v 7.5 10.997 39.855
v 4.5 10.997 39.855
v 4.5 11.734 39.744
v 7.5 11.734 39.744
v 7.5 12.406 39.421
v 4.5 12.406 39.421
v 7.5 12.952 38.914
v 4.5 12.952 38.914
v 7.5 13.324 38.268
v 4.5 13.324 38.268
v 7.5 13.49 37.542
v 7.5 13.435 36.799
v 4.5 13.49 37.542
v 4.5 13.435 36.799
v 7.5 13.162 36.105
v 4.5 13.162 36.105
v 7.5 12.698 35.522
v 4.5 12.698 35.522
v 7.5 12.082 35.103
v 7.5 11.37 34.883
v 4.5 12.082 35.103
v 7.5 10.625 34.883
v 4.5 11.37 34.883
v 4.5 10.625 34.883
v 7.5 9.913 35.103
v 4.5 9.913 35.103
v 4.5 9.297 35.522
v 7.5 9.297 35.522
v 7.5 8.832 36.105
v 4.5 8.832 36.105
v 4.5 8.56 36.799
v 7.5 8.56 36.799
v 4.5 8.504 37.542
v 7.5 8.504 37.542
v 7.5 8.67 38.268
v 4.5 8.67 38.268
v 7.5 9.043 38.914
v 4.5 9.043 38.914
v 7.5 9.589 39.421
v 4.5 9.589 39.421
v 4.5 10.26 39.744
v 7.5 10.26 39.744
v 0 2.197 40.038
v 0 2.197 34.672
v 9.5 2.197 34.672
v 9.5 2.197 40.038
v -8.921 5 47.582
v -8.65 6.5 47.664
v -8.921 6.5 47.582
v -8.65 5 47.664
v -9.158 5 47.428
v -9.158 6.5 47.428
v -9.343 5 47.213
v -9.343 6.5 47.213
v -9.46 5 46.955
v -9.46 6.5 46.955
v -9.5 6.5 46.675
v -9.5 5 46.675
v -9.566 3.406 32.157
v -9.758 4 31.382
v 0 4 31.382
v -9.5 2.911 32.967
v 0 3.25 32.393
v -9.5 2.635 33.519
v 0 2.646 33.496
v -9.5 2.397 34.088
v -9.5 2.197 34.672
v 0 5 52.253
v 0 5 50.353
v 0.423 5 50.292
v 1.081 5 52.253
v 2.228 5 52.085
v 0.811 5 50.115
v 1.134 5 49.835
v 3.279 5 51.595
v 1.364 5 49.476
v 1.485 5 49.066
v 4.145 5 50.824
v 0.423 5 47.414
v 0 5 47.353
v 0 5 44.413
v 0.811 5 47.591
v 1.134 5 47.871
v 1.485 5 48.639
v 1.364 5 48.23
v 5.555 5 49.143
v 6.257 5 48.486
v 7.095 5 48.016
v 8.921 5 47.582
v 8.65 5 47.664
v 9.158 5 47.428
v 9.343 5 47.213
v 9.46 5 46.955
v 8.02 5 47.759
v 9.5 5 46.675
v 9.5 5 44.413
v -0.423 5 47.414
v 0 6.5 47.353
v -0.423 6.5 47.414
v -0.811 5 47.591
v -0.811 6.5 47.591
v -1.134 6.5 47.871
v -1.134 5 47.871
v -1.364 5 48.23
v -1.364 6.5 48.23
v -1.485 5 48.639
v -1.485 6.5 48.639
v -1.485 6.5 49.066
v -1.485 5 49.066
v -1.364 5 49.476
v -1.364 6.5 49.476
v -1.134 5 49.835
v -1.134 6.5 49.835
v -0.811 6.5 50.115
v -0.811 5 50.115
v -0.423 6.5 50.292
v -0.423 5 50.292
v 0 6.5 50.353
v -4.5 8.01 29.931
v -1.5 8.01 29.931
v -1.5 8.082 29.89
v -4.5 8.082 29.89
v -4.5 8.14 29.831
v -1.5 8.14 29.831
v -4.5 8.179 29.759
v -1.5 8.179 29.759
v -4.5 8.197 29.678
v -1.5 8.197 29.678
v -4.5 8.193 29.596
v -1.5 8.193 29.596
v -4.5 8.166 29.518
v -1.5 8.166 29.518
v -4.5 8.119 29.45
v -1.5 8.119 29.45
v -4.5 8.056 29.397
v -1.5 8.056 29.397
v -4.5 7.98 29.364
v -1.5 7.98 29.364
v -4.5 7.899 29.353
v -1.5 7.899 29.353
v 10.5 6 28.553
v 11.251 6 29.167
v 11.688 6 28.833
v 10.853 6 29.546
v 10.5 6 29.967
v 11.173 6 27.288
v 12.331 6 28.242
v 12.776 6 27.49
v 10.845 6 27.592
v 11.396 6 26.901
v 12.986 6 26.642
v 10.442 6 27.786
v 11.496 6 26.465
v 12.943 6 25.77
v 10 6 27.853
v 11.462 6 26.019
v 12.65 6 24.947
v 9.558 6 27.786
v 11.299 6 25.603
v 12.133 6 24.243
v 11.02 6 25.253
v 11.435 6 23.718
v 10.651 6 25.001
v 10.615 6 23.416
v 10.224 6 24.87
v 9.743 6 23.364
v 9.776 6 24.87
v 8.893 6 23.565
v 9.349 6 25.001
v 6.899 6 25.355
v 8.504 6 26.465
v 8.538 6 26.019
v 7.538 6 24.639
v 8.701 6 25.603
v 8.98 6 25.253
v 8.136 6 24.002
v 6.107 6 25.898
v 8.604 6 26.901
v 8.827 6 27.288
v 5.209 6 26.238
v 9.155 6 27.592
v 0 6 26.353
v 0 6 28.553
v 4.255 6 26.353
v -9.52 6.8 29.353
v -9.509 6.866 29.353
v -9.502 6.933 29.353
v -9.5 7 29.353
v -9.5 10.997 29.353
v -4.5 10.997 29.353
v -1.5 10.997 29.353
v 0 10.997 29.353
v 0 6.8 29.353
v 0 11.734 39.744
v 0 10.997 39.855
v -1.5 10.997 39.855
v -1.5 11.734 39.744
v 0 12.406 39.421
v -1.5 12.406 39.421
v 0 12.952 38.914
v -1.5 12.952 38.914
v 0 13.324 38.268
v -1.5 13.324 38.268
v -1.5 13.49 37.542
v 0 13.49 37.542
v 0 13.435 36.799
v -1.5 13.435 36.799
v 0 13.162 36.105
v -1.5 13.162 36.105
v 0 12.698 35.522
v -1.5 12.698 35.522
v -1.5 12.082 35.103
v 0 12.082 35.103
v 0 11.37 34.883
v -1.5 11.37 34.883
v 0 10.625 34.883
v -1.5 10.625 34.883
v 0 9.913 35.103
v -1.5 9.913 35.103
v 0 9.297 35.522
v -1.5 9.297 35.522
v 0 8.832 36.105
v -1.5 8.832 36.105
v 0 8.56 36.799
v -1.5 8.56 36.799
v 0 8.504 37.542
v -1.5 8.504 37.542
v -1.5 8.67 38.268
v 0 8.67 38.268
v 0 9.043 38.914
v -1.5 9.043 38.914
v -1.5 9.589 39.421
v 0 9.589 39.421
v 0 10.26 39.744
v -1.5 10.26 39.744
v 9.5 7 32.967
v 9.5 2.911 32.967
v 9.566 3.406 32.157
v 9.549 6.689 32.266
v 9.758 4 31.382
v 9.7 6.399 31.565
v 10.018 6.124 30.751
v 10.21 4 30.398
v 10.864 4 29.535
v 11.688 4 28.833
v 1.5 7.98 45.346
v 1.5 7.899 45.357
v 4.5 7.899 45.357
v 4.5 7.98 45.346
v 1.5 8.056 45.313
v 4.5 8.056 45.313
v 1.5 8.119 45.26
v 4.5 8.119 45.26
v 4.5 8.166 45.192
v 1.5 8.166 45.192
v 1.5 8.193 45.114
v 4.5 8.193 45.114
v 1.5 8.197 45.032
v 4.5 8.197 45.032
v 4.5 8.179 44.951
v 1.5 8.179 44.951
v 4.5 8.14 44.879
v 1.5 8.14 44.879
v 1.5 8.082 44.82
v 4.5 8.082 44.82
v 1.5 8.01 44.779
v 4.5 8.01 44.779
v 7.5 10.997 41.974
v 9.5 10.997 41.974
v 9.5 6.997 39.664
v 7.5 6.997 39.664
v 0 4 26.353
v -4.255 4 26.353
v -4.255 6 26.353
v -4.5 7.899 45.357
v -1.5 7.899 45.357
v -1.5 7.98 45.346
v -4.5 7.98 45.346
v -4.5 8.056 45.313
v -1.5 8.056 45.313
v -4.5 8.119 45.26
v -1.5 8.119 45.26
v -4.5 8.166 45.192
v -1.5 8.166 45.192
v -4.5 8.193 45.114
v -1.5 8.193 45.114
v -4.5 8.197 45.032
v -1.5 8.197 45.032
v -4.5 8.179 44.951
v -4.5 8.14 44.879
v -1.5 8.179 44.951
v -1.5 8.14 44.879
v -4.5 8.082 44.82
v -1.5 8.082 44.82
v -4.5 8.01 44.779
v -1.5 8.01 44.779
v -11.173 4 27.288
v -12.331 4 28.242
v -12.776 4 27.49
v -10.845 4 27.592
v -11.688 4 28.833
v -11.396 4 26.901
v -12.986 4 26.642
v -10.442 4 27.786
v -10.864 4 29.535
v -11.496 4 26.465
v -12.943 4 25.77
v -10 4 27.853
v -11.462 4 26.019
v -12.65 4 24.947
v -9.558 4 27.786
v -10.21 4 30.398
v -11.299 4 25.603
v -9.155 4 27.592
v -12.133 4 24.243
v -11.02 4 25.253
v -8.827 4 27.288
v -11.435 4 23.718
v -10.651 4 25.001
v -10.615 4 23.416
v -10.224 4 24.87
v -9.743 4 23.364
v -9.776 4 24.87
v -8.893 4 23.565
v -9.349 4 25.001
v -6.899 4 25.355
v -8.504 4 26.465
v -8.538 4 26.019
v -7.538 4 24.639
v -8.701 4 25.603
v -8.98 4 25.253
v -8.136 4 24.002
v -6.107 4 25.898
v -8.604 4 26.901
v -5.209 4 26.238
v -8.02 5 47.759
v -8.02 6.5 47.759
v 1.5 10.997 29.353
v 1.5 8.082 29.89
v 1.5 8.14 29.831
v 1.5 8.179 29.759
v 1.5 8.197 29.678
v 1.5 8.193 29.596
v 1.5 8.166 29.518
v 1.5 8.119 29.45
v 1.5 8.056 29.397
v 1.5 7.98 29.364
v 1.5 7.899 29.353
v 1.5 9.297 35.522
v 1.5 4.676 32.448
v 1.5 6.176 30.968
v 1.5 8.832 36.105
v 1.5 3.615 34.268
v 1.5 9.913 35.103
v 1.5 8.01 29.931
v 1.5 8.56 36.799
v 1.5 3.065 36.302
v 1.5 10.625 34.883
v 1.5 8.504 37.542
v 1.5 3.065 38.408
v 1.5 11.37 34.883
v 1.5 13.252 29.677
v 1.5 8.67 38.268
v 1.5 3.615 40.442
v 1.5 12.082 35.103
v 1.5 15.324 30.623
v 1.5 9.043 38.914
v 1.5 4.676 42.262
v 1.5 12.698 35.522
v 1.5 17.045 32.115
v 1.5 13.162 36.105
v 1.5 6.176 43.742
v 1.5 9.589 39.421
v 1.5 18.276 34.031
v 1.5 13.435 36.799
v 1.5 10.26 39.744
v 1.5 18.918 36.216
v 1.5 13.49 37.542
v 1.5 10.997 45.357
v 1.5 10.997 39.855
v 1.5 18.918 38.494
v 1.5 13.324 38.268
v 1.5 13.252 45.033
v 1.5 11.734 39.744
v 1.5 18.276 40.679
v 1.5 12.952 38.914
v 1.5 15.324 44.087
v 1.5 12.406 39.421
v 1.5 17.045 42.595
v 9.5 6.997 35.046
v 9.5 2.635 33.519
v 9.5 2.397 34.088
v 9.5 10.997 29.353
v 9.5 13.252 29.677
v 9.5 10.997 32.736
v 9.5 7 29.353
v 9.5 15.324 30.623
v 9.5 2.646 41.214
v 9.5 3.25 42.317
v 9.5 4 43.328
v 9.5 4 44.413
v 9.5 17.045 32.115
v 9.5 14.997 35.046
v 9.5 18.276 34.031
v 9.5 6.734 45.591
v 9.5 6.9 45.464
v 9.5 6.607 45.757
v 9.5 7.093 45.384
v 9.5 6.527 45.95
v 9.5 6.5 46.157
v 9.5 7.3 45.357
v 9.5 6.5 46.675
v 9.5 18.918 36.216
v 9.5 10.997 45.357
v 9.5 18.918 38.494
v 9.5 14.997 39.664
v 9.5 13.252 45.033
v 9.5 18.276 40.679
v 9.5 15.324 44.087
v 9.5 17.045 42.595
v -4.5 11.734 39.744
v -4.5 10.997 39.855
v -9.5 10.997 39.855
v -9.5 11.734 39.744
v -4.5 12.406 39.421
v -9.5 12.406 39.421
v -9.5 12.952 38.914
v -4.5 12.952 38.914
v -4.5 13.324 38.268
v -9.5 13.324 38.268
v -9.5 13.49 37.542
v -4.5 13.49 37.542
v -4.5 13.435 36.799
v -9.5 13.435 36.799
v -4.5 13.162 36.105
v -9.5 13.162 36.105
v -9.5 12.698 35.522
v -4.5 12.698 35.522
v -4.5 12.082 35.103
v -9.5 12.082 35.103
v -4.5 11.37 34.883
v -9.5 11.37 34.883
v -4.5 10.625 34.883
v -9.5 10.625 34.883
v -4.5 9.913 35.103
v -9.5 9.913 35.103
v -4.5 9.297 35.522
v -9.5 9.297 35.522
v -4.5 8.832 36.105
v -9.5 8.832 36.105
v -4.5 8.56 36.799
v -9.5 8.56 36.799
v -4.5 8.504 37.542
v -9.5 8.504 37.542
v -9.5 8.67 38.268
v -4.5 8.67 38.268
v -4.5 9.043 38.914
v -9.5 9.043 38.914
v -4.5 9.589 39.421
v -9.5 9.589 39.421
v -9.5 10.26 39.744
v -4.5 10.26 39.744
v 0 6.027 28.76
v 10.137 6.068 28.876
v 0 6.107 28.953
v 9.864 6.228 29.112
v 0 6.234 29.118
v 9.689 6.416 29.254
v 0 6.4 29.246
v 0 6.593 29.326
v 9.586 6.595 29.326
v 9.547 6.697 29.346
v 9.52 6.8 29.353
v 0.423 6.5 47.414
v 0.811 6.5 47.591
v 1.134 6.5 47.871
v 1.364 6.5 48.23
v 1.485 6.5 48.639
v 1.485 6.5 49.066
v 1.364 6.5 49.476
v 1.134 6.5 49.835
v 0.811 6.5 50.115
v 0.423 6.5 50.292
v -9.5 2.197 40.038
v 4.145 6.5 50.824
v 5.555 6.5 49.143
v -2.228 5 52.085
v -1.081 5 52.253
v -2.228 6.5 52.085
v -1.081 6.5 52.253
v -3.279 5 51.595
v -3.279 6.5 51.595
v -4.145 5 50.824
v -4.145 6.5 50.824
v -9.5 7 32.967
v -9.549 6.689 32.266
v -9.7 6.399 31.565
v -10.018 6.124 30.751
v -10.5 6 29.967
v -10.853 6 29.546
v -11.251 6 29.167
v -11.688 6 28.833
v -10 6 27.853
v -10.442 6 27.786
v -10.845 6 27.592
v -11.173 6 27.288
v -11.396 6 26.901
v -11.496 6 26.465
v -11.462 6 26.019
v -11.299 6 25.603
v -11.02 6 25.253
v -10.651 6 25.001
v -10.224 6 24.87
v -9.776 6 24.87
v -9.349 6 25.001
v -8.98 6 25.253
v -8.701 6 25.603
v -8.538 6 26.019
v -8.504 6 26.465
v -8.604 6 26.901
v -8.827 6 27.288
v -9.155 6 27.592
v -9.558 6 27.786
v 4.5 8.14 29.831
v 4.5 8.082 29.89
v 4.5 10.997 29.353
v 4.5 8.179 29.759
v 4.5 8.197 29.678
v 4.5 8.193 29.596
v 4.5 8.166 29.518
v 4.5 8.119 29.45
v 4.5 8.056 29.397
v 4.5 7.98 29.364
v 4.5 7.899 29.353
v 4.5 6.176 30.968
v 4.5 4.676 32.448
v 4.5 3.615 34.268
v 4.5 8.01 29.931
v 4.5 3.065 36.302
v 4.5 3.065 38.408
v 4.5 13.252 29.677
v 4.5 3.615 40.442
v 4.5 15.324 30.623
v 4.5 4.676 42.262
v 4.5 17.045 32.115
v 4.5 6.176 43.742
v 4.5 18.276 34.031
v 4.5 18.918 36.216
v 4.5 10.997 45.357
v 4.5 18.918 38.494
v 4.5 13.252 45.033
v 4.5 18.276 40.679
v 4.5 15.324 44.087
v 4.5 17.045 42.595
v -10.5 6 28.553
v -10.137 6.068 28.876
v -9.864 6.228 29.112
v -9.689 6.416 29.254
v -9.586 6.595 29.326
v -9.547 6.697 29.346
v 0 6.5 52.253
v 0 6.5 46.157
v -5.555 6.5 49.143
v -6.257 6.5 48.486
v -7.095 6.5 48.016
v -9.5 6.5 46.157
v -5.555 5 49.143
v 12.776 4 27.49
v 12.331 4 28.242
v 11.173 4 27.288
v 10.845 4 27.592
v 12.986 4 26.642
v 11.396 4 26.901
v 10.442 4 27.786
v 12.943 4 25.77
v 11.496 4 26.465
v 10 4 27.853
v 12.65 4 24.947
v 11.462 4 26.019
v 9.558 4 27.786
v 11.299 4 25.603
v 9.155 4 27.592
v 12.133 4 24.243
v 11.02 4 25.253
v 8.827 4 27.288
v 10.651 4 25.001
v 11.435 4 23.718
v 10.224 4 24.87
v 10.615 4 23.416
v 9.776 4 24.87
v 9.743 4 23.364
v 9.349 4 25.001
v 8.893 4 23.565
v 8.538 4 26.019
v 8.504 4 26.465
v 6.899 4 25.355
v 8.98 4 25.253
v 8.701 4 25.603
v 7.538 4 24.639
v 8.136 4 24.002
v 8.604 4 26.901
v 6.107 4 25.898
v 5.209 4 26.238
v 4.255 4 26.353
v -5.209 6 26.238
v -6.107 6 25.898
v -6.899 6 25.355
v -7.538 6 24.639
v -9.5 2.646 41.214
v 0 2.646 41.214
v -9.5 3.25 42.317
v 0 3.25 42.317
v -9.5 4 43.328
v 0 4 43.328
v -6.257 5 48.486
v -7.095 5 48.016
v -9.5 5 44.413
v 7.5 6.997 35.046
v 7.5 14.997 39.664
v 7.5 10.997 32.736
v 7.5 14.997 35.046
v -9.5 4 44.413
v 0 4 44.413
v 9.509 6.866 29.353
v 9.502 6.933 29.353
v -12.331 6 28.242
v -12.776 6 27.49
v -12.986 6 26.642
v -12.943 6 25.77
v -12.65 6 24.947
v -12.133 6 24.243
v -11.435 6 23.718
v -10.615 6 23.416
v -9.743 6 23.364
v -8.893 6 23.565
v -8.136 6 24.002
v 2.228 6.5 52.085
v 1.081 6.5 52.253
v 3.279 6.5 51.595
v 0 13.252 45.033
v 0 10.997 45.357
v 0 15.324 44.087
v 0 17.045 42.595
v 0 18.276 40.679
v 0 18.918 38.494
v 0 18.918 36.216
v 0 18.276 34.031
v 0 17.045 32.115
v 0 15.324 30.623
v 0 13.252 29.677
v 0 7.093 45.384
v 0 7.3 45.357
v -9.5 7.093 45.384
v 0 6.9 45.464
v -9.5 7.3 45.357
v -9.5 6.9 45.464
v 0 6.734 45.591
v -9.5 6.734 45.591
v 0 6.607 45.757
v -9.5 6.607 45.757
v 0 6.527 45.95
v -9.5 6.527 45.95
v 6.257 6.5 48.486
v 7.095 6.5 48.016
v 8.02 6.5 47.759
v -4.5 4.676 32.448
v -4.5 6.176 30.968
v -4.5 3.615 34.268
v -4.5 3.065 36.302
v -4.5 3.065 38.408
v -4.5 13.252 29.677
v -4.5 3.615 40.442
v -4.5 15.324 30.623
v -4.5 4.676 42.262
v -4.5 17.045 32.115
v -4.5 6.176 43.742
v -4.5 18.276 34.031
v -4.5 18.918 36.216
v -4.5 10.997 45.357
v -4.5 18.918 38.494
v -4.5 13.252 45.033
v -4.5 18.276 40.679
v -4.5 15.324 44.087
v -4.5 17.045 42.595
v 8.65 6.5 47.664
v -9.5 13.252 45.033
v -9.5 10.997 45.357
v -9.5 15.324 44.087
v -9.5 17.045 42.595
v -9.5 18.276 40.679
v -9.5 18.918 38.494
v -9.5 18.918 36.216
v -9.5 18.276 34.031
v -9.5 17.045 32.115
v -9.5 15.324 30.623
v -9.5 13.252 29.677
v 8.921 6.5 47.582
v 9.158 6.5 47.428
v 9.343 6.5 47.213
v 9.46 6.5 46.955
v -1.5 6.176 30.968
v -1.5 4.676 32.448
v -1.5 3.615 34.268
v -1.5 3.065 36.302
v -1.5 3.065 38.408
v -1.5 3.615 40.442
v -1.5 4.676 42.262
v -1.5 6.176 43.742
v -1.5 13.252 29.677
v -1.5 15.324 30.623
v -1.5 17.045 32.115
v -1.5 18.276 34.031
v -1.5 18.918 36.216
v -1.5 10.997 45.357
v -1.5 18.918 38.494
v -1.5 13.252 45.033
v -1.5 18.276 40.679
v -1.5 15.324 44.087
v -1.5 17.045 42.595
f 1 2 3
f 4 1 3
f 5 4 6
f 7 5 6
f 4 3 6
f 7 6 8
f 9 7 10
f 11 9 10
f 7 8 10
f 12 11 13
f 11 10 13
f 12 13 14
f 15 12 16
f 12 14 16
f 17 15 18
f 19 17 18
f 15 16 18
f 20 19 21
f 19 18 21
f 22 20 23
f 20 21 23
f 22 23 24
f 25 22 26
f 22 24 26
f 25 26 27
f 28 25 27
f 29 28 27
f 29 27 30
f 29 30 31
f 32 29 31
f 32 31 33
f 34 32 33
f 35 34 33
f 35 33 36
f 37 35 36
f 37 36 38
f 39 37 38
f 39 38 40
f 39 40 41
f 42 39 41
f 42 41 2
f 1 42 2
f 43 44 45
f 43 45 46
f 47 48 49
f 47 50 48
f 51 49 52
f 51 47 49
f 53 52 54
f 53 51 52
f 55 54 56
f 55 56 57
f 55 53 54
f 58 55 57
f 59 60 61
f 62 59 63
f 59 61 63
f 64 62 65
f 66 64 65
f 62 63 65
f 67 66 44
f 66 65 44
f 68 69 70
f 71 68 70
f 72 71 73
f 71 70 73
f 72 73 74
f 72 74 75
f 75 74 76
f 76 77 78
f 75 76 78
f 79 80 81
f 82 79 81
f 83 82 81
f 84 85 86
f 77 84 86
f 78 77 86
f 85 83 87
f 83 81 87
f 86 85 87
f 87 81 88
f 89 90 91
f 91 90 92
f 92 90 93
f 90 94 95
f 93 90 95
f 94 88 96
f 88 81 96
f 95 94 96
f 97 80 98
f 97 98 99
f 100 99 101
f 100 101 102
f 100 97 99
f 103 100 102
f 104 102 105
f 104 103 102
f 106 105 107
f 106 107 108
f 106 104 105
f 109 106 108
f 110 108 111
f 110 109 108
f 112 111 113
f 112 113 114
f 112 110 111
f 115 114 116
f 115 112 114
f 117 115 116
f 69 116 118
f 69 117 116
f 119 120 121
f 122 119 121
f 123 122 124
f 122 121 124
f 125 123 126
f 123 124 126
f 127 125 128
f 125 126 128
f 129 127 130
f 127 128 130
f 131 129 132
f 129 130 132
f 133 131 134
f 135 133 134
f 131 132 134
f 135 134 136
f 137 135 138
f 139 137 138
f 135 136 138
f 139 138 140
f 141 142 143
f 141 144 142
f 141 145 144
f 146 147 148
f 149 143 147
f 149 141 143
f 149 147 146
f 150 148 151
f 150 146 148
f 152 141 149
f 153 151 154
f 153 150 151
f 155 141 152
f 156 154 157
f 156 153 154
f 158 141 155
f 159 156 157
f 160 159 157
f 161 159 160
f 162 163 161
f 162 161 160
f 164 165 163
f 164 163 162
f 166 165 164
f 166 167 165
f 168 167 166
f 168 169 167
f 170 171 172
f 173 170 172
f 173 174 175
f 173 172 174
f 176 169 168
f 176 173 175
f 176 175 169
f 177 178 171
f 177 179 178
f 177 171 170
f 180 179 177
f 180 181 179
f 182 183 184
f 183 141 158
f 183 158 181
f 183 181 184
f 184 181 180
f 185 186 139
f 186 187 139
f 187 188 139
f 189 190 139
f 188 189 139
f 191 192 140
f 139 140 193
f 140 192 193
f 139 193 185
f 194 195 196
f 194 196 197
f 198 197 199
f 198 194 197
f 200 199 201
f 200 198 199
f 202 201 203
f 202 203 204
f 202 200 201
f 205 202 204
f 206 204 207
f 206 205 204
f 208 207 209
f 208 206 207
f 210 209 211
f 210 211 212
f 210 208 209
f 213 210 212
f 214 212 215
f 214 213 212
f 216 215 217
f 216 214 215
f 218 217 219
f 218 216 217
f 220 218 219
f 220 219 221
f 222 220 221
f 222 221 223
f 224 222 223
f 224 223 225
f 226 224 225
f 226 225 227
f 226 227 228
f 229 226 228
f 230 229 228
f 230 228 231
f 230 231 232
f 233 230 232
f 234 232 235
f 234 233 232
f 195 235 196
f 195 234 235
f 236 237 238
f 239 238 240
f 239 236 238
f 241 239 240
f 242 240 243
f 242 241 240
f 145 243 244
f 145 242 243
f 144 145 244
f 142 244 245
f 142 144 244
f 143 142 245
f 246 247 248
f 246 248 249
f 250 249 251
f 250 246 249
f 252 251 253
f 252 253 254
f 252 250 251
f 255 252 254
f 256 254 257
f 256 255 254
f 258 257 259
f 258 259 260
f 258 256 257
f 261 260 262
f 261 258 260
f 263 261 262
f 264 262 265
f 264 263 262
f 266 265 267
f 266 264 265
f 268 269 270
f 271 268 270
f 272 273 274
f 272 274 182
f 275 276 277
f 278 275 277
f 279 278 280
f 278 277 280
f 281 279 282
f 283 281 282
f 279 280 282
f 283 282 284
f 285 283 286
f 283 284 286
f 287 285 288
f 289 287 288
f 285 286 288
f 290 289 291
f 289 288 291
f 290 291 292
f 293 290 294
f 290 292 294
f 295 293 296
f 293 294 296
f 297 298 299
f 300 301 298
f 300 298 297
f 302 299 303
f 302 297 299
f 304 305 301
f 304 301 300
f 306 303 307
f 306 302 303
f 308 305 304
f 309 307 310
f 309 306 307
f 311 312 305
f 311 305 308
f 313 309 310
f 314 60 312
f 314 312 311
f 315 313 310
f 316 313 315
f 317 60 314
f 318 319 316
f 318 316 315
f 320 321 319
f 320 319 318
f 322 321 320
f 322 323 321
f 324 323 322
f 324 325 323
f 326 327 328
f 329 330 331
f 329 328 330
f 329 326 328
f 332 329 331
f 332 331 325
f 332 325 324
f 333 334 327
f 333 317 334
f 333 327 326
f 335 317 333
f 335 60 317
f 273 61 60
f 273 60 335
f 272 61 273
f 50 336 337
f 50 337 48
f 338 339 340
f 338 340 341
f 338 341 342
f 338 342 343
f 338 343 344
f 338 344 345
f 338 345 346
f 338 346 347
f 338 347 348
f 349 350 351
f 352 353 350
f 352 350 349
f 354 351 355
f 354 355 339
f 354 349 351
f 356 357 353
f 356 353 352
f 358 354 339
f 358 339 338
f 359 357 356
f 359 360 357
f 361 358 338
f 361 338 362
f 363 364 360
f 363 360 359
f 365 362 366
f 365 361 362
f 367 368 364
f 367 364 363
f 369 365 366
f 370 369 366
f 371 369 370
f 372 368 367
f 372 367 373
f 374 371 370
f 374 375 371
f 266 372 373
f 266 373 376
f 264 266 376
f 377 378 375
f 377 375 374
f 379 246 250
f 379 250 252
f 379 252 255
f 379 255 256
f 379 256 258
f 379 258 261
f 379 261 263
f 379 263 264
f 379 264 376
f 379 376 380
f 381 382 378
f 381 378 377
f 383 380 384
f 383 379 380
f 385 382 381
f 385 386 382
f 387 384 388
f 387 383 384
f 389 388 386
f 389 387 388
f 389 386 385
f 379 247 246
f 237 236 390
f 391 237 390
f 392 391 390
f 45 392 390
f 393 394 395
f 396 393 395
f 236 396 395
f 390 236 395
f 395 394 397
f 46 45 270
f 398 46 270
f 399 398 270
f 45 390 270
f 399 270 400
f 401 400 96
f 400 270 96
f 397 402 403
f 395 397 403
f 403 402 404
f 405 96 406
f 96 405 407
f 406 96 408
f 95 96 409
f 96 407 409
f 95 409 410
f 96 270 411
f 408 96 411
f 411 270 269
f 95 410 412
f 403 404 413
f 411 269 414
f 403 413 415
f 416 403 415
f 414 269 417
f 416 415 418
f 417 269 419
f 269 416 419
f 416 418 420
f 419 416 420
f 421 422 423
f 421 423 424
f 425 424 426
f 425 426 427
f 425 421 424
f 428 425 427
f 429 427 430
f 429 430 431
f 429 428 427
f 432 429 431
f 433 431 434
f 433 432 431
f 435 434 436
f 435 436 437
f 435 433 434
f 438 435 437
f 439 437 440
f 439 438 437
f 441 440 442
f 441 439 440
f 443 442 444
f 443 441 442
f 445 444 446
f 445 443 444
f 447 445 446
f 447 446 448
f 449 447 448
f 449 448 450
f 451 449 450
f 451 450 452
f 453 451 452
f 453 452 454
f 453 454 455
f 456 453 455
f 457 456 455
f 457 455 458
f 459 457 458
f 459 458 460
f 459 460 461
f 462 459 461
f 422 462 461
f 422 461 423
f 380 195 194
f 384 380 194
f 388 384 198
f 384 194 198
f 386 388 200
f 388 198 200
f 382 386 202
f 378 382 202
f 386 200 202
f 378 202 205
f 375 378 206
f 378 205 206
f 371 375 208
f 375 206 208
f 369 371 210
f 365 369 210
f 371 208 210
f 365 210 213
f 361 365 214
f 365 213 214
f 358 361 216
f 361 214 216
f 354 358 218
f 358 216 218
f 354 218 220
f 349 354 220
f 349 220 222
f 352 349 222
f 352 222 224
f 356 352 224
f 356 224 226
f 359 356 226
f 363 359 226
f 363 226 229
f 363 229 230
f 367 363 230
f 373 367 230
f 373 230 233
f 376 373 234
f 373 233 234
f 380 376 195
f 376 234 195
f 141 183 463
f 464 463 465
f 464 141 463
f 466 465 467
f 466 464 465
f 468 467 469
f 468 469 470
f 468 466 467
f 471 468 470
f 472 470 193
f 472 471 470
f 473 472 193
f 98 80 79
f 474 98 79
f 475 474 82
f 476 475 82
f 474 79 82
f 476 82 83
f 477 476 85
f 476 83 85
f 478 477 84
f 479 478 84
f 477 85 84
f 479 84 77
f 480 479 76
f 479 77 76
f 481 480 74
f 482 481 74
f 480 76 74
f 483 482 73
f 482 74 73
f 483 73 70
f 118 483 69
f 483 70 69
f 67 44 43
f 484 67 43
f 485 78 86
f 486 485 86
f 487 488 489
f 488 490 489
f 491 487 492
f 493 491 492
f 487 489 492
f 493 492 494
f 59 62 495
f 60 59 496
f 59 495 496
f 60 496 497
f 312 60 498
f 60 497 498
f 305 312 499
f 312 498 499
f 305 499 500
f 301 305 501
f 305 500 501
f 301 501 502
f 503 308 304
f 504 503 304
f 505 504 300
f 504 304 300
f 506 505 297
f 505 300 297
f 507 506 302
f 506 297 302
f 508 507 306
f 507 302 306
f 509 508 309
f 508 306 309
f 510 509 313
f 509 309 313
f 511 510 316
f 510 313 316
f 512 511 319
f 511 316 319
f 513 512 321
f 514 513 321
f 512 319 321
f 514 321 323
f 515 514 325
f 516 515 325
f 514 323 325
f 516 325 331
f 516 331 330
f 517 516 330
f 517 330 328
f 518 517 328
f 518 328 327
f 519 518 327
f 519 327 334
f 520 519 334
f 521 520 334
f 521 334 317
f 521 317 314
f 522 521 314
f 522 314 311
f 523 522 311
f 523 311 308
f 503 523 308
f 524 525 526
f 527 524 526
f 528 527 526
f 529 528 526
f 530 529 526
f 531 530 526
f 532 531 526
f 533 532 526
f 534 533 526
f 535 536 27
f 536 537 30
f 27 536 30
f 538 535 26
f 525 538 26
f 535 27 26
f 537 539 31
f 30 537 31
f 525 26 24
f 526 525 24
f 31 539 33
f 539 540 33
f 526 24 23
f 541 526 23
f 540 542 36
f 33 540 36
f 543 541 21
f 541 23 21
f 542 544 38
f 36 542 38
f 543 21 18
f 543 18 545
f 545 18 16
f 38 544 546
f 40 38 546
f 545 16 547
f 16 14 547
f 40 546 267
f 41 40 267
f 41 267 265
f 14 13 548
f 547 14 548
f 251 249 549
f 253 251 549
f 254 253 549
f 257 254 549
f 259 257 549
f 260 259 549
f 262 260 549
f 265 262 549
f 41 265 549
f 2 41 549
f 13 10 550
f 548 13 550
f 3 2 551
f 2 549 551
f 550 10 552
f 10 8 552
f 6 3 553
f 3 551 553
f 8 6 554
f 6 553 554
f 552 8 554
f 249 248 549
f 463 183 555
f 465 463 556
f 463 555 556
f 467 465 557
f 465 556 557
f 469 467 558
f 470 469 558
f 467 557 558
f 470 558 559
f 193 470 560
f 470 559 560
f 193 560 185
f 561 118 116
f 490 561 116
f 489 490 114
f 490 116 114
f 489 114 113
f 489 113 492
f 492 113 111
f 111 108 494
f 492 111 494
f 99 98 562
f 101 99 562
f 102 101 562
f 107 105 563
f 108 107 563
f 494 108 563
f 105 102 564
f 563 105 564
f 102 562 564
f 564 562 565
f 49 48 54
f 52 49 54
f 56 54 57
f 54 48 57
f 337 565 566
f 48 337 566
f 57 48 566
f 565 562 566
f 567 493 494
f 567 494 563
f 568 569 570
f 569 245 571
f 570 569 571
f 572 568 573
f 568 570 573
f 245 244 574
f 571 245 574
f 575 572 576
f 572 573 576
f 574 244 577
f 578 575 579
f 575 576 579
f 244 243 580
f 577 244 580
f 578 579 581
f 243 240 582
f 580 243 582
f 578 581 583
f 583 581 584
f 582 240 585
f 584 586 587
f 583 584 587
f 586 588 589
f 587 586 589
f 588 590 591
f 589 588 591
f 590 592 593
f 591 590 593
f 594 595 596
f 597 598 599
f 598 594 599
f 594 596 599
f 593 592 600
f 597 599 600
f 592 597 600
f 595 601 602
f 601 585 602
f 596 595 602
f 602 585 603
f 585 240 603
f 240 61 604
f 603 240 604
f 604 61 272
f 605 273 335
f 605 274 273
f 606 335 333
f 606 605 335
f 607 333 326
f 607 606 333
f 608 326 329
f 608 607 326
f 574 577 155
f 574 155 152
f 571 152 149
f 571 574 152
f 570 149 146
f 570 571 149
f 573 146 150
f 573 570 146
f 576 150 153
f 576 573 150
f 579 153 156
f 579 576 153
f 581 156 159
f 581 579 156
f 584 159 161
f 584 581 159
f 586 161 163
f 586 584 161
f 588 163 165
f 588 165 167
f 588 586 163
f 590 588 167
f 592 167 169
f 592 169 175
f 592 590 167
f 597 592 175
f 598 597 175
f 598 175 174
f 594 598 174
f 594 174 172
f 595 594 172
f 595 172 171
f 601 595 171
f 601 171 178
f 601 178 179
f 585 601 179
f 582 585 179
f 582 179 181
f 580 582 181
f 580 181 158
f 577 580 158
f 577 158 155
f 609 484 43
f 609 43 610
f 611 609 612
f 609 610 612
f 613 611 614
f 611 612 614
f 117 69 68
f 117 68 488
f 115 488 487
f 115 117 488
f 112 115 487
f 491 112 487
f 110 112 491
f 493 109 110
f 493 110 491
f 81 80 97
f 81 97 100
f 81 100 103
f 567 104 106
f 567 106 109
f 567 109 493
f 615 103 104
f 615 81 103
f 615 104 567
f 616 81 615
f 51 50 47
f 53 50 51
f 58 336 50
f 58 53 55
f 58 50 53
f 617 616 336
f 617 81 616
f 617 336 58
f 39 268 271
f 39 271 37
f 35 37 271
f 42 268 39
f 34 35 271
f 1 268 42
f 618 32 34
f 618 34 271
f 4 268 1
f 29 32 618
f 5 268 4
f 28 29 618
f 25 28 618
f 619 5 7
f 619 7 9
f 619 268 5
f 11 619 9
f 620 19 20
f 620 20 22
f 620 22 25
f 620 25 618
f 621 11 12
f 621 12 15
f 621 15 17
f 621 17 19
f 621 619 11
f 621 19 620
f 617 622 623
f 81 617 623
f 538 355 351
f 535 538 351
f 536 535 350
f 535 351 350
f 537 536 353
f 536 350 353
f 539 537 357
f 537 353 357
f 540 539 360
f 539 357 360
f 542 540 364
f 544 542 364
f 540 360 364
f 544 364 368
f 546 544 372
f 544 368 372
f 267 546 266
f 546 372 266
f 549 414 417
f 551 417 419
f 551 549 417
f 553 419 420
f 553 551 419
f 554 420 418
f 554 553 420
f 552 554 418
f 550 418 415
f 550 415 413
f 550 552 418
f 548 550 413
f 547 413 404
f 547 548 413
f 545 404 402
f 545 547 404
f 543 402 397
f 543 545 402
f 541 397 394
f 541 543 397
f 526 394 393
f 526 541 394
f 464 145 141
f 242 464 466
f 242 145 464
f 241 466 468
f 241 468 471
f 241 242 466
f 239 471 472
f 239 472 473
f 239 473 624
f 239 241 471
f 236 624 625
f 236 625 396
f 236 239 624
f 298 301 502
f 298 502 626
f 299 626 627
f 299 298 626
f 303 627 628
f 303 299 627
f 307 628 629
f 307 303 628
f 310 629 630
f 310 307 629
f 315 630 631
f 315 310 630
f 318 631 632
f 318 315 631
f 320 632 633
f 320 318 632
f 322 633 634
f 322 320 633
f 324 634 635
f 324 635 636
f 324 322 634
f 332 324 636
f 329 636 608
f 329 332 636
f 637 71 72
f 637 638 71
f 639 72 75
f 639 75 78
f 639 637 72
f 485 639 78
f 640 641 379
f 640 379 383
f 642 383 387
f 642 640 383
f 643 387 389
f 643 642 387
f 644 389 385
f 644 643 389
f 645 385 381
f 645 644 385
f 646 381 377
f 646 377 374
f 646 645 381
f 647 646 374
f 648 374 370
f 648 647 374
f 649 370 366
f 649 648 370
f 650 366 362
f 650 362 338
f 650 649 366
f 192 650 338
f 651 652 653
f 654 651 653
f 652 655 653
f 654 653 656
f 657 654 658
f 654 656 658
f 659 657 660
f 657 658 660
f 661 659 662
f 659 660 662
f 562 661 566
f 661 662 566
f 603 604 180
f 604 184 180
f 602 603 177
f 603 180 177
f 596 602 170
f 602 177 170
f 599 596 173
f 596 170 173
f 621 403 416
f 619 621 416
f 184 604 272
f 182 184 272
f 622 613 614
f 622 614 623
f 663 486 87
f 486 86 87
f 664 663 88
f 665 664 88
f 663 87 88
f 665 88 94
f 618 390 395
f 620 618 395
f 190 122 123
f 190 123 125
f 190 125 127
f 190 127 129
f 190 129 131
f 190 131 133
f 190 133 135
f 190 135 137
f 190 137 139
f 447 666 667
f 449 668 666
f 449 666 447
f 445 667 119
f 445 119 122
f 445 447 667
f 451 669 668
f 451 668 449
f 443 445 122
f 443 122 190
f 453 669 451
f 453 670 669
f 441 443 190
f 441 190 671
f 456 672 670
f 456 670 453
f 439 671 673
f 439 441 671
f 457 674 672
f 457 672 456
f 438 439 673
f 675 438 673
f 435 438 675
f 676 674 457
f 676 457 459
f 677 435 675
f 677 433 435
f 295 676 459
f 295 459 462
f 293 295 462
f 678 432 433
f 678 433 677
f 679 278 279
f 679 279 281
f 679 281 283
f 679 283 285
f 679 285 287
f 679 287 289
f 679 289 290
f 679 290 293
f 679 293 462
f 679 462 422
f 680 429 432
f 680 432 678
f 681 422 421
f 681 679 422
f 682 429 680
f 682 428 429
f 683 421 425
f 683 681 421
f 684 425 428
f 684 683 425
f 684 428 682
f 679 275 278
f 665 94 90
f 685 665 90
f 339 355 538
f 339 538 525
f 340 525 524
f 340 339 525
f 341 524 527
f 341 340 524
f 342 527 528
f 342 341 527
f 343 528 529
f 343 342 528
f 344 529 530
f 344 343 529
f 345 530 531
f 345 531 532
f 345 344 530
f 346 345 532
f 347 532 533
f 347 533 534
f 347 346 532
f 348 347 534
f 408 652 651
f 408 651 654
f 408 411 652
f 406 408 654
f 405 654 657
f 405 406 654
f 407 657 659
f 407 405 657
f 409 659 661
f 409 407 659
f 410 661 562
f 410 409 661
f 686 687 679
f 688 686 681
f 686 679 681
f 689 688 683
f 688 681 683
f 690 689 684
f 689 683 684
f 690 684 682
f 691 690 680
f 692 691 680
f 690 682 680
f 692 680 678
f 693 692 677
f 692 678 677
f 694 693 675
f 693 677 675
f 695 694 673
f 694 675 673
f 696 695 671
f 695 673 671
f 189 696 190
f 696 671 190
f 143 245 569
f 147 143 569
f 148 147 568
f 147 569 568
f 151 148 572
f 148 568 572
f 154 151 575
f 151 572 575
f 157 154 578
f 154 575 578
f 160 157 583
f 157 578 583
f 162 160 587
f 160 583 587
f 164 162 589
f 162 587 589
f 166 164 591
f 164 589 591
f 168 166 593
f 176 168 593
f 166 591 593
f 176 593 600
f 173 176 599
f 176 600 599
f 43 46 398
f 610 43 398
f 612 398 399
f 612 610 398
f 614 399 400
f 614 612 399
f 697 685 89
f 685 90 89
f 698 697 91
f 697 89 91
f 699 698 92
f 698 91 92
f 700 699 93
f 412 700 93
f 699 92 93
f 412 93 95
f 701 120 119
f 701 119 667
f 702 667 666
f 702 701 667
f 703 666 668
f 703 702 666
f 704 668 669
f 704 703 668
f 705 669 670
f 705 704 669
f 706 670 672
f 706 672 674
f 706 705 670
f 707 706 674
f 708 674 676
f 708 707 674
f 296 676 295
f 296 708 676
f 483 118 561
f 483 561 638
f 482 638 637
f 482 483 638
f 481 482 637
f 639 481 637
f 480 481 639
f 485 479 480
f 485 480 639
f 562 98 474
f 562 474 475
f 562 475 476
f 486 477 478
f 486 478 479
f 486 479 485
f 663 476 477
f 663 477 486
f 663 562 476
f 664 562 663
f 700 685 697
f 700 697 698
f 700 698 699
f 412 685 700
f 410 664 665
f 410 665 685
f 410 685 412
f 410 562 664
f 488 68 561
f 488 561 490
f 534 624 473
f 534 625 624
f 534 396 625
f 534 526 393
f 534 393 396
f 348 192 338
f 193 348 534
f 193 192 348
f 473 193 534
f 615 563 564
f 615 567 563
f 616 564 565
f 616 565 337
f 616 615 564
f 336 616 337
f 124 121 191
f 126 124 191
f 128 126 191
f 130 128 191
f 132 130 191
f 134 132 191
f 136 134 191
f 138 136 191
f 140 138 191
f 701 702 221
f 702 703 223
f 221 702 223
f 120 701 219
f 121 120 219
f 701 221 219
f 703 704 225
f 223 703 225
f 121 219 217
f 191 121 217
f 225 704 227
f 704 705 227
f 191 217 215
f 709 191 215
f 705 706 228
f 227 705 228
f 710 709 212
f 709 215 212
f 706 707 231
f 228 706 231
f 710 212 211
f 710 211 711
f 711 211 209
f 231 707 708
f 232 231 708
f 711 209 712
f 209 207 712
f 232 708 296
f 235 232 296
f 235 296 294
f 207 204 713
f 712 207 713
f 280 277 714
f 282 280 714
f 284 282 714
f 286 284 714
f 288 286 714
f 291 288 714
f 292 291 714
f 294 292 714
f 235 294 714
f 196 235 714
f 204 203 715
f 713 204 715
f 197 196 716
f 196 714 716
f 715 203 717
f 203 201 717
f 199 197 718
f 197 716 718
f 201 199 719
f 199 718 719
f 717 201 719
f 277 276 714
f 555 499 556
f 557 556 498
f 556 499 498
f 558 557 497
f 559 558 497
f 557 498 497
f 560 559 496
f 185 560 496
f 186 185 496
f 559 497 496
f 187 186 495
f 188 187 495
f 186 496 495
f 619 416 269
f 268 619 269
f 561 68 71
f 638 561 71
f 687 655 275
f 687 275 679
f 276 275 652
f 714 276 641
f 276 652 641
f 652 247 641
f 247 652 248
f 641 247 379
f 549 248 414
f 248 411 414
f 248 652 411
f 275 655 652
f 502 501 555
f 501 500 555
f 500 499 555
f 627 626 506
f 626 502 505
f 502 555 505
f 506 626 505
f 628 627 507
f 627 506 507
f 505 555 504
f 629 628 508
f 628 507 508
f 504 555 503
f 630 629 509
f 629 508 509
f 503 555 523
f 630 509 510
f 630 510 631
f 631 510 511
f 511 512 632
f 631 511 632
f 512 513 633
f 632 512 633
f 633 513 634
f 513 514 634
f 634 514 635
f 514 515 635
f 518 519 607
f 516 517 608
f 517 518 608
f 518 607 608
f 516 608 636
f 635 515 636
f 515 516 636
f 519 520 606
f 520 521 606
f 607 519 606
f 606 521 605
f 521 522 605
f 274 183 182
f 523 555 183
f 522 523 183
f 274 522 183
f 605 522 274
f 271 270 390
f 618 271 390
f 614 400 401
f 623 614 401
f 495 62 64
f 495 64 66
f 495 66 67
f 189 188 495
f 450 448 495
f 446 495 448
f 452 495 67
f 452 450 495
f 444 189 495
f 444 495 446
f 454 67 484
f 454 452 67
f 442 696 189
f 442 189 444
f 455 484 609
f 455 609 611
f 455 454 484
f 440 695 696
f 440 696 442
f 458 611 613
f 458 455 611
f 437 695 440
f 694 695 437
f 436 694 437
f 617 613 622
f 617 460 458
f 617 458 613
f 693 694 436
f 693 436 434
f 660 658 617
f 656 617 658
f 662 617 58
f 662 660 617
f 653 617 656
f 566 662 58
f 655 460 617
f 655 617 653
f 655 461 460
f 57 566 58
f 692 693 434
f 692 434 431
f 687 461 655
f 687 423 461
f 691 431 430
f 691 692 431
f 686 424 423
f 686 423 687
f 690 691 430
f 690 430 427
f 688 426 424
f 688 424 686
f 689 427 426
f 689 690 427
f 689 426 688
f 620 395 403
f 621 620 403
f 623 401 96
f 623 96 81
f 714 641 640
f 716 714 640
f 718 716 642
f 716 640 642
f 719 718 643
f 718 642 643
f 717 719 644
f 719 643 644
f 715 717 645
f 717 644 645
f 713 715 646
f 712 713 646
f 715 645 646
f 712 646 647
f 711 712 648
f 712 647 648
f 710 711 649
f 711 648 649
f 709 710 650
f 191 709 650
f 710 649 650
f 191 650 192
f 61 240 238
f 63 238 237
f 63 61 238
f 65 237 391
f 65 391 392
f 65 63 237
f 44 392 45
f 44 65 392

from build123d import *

# Parameters (mm, degrees)
EXTRUDE_1_DEPTH     = 6.5
SKETCH_1_7_R        = 1.5000000000000009
EXTRUDE_2_DEPTH     = 6
SKETCH_1_5_R        = 1.5000000000000009
CUT_EXTRUDE_1_DEPTH = 4
SKETCH_4_R          = 2.5000000000000018
EXTRUDE_3_DEPTH     = 9.5
SKETCH_4_3_R        = 8.002176317228214
CUT_EXTRUDE_3_DEPTH = 4.5
SKETCH_4_4_R        = 8.002176317228214
SKETCH_4_4_R_2      = 2.5000000000000018
EXTRUDE_4_DEPTH     = 1.5
CUT_EXTRUDE_7_DEPTH = 5
FILLET_10_R         = 5
FILLET_12_R         = 1
FILLET_8_R          = 4
FILLET_15_R         = 4
FILLET_14_R         = 0.8
FILLET_START        = 1.5
FILLET_16_DEPTH     = 3
CUT_EXTRUDE_8_DEPTH = 2


with BuildPart() as part:
    # 草图1 → 凸台-拉伸1 (new body)
    with BuildSketch(Plane(origin=(0, 0, 0), x_dir=(1, 0, 0), z_dir=(0, 1, 0))):
        with BuildLine():
            Line((6.526515759031646, -47.98540773429276), (9.500000000000004, -47.53500853797252))
            Line((9.5, -47.53500853797252), (9.5, -44.41312259021298))
            Line((9.5, -44.41312259021298), (-3.197e-14, -44.41312259021298))
            Line((-3.234e-14, -44.41312259021298), (-3.819e-14, -47.352813742384996))
            ThreePointArc((-3.795e-14, -47.352813742384996), (1.4999999999999172, -48.852813742385), (-6.167e-14, -50.35281374238498))
            Line((-6.167e-14, -50.35281374238498), (5e-17, -52.25281374238501))
            Line((5e-17, -52.25281374238501), (2.945736951557686, -52.25281374238501))
            Line((2.9457369515576866, -52.25281374238501), (6.52651575903164, -47.98540773429274))
        make_face()
    extrude(amount=EXTRUDE_1_DEPTH)

    # 草图1<7> → 凸台-拉伸2 (add)
    # profile 1 of 2: a face of its own
    with BuildSketch(Plane(origin=(0, 0, 0), x_dir=(1, 0, 0), z_dir=(0, 1, 0))):
        with BuildLine():
            Line((6.52651575903165, -47.98540773429276), (9.500000000000004, -47.53500853797252))
            Line((9.5, -47.53500853797252), (9.5, -44.41312259021298))
            Line((9.5, -44.41312259021298), (2.9999616443939274, -44.41312259021298))
            Line((2.9999616443939274, -44.41312259021298), (-3.197e-14, -44.41312259021298))
            Line((-3.234e-14, -44.41312259021298), (-3.532e-14, -45.852813742384946))
            ThreePointArc((-3.498e-14, -45.852813742384946), (2.001072491845667, -46.61770549391504), (2.981742421540369, -48.52234115413275))
            Line((2.981742421540467, -48.52234115413273), (6.52651575903165, -47.98540773429276))
        make_face()
    # profile 2 of 2: a face of its own
    with BuildSketch(Plane(origin=(0, 0, 0), x_dir=(1, 0, 0), z_dir=(0, 1, 0))):
        with BuildLine():
            Line((0, -29.352813742384996), (9.999999999999913, -29.352813742384996))
            ThreePointArc((9.999999999999913, -29.352813742384996), (12.121320343559674, -24.231493398825386), (7, -26.352813742384992))
            Line((6.999999999999999, -26.352813742384996), (-4.796e-14, -26.352813742384996))
            Line((0, -26.352813742384996), (0, -29.352813742384996))
        make_face()
        with Locations(Location((9.999999999999998, -26.352813742384996, 0), (0, 0, 270))):
            Circle(SKETCH_1_7_R, mode=Mode.SUBTRACT)
    extrude(amount=EXTRUDE_2_DEPTH)


with BuildPart() as extrude_2_piece_1:
    # of the separate pieces the step leaves, piece 1, a body of its own (extrude_2_pieces)
    add(part.part.solids().sort_by_distance((6.526515759, 0, 47.985407734))[0])


with BuildPart() as extrude_2_piece_2:
    # of the separate pieces the step leaves, piece 2, a body of its own (extrude_2_pieces)
    add(part.part.solids().sort_by_distance((0, 0, 26.352813742))[0])


with BuildPart() as cut_extrude_1_tool:
    # 草图1<5> → 切除-拉伸1 (new body)
    # profile 1 of 3: a face of its own
    with BuildSketch(Plane(origin=(0, 0, 0), x_dir=(1, 0, 0), z_dir=(0, 1, 0))):
        with BuildLine():
            ThreePointArc((1.232e-14, -51.85281374238499), (2.2351082484699845, -50.85388623423072), (2.9817424215404666, -48.52234115413273))
            ThreePointArc((2.981742421540369, -48.52234115413275), (2.001072491845667, -46.61770549391504), (-3.498e-14, -45.852813742384946))
            Line((-3.532e-14, -45.852813742384946), (-3.843e-14, -47.352813742384996))
            ThreePointArc((-3.795e-14, -47.352813742384996), (1.4999999999999172, -48.852813742385), (-6.167e-14, -50.35281374238498))
            Line((-6.167e-14, -50.35281374238498), (1.27e-14, -51.85281374238499))
        make_face()
    # profile 2 of 3: a face of its own
    with BuildSketch(Plane(origin=(0, 0, 0), x_dir=(1, 0, 0), z_dir=(0, 1, 0))):
        with BuildLine():
            Line((6.52651575903165, -47.98540773429276), (9.500000000000004, -47.53500853797252))
            Line((9.5, -47.53500853797252), (9.5, -44.41312259021298))
            Line((9.5, -44.41312259021298), (2.9999616443939274, -44.41312259021298))
            Line((2.9999616443939274, -44.41312259021298), (-3.197e-14, -44.41312259021298))
            Line((-3.234e-14, -44.41312259021298), (-3.532e-14, -45.852813742384946))
            ThreePointArc((-3.498e-14, -45.852813742384946), (2.001072491845667, -46.61770549391504), (2.981742421540369, -48.52234115413275))
            Line((2.981742421540467, -48.52234115413273), (6.52651575903165, -47.98540773429276))
        make_face()
    # profile 3 of 3: a face of its own
    with BuildSketch(Plane(origin=(0, 0, 0), x_dir=(1, 0, 0), z_dir=(0, 1, 0))):
        with BuildLine():
            Line((0, -29.352813742384996), (9.999999999999913, -29.352813742384996))
            ThreePointArc((9.999999999999913, -29.352813742384996), (12.121320343559674, -24.231493398825386), (7, -26.352813742384992))
            Line((6.999999999999999, -26.352813742384996), (-4.796e-14, -26.352813742384996))
            Line((0, -26.352813742384996), (0, -29.352813742384996))
        make_face()
        with Locations(Location((9.999999999999998, -26.352813742384996, 0), (0, 0, 270))):
            Circle(SKETCH_1_5_R, mode=Mode.SUBTRACT)
    extrude(amount=CUT_EXTRUDE_1_DEPTH)


with BuildPart() as extrude_2_piece_1_1:
    add(extrude_2_piece_1.part)

    # 切除-拉伸1: cut by cut_extrude_1_tool
    add(cut_extrude_1_tool.part, mode=Mode.SUBTRACT)



with BuildPart() as extrude_2_piece_2_1:
    add(extrude_2_piece_2.part)

    # 切除-拉伸1: cut by cut_extrude_1_tool
    add(cut_extrude_1_tool.part, mode=Mode.SUBTRACT)


with BuildPart() as extrude_2_piece_1_2:
    add(extrude_2_piece_1_1.part)

    add(extrude_2_piece_2_1.part)  # 凸台-拉伸3 merges 凸台-拉伸2 piece 2
    # 草图4 → 凸台-拉伸3 (add)
    with BuildSketch(Plane.ZY):
        with BuildLine():
            Line((43.32806789988807, 4), (44.41312259021298, 4))
            Line((44.41312259021298, 4), (44.41312259021298, 6.5))
            Line((44.41312259021298, 6.5), (45.35716637684143, 6.5))
            Line((45.35716637684143, 6.5), (45.35716637684143, 10.99730956254026))
            ThreePointArc((45.35716637684142, 10.99730956254026), (37.35499005961321, 18.99948587976847), (29.352813742384996, 10.997309562540261))
            Line((29.352813742384996, 10.99730956254026), (29.352813742384996, 4))
            Line((29.352813742384996, 4), (31.381912219338343, 4))
            ThreePointArc((31.381912219338343, 3.9999999999999982), (32.93395366796542, 2.929197191996211), (34.67170848661348, 2.1973095625402532))
            Line((34.67170848661348, 2.1973095625402554), (40.03827163261293, 2.1973095625402554))
            ThreePointArc((40.03827163261293, 2.1973095625402532), (41.776026451261, 2.929197191996213), (43.32806789988807, 4))
        make_face()
        with Locations((37.35499005961321, 10.99730956254026)):
            Circle(SKETCH_4_R, mode=Mode.SUBTRACT)
    extrude(amount=-EXTRUDE_3_DEPTH)

    # 草图4<3> → 切除-拉伸3 (cut)
    with BuildSketch(Plane.ZY):
        with Locations((37.35499005961321, 10.99730956254026)):
            Circle(SKETCH_4_3_R)
    extrude(amount=-CUT_EXTRUDE_3_DEPTH, mode=Mode.SUBTRACT)

    # 草图4<4> → 凸台-拉伸4 (add)
    with BuildSketch(Plane.ZY):
        with Locations((37.35499005961321, 10.99730956254026)):
            Circle(SKETCH_4_4_R)
        with Locations((37.35499005961321, 10.99730956254026)):
            Circle(SKETCH_4_4_R_2, mode=Mode.SUBTRACT)
    extrude(amount=-EXTRUDE_4_DEPTH)

    # 草图1<8> → 切除-拉伸7 (cut)
    with BuildSketch(Plane(origin=(0, 0, 0), x_dir=(1, 0, 0), z_dir=(0, 1, 0))):
        with BuildLine():
            Line((6.52651575903165, -47.98540773429276), (9.500000000000004, -47.53500853797252))
            Line((9.5, -47.53500853797252), (9.5, -44.41312259021298))
            Line((9.5, -44.41312259021298), (2.9999616443939274, -44.41312259021298))
            Line((2.9999616443939274, -44.41312259021298), (-3.197e-14, -44.41312259021298))
            Line((-3.234e-14, -44.41312259021298), (-3.532e-14, -45.852813742384946))
            ThreePointArc((-3.365e-14, -45.852813742384946), (2.001072491845667, -46.61770549391504), (2.9817424215403685, -48.52234115413274))
            Line((2.981742421540467, -48.52234115413273), (6.52651575903165, -47.98540773429276))
        make_face()
        with BuildLine():
            ThreePointArc((1.232e-14, -51.85281374238499), (2.2351082484699845, -50.85388623423072), (2.9817424215404666, -48.52234115413273))
            ThreePointArc((2.981742421540369, -48.52234115413275), (2.001072491845667, -46.61770549391504), (-3.498e-14, -45.852813742384946))
            Line((-3.532e-14, -45.852813742384946), (-3.843e-14, -47.352813742384996))
            ThreePointArc((-3.795e-14, -47.352813742384996), (1.4999999999999172, -48.852813742385), (-6.167e-14, -50.35281374238498))
            Line((-6.167e-14, -50.35281374238498), (1.27e-14, -51.85281374238499))
        make_face()
        with BuildLine():
            Line((2.9457369515576866, -52.25281374238501), (6.52651575903164, -47.98540773429274))
            Line((6.52651575903165, -47.98540773429276), (2.981742421540467, -48.52234115413273))
            ThreePointArc((2.9817424215404666, -48.52234115413273), (2.2351082484699845, -50.85388623423072), (1.232e-14, -51.85281374238499))
            Line((1.27e-14, -51.85281374238499), (5e-17, -52.25281374238501))
            Line((5e-17, -52.25281374238501), (2.945736951557686, -52.25281374238501))
        make_face()
    extrude(amount=CUT_EXTRUDE_7_DEPTH, mode=Mode.SUBTRACT)

    # 圆角10
    # the kernel refuses this fillet: 5 mm, written as the material it adds along each edge
    with BuildSketch(Plane(origin=(9.5, 6, 29.352813742384996), x_dir=(0, 0, 1), z_dir=(0, -1, 0))) as fillet_10_piece_1:
        with BuildLine():
            CenterArc((3.614378277661473, -5), FILLET_10_R, 90, 55.77113367218743)
            Line((-0.5196081458769513, -2.1875), (-0.9330067882307951, -1.90625))
            ThreePointArc((-0.9330067882307951, -1.90625), (-0.5, -0.49999999999992717), (-0.5, 0))
            Line((-0.5, 0), (0, 0.5))
            Line((0, 0.5), (3.614378277661473, 0.5))
            Line((3.614378277661473, 0.5), (3.614378277661473, 0))
        make_face()
    extrude(amount=2)
    with BuildSketch(Plane(origin=(9.5, 6, 29.352813742384996), x_dir=(0, 0, 1), z_dir=(0, -1, 0))) as fillet_10_piece_2_section:
        with BuildLine():
            CenterArc((3.614378277661473, -5), FILLET_10_R, 90, 55.77113367218743)
            Line((-0.5196081458769513, -2.1875), (-0.9330067882307951, -1.90625))
            ThreePointArc((-0.9330067882307951, -1.90625), (-0.5, -0.49999999999992717), (-0.5, 0))
            Line((-0.5, 0), (0, 0.5))
            Line((0, 0.5), (3.614378277661473, 0.5))
            Line((3.614378277661473, 0.5), (3.614378277661473, 0))
        make_face()
    fillet_10_piece_2 = extrude(amount=11.035945694153682, mode=Mode.PRIVATE)
    fillet_10_piece_2 = fillet_10_piece_2 & Plane(origin=(9.5, 10.997309562540337, 37.35499005961324), x_dir=(0, -0.7605771263630735, -0.6492475913342225), z_dir=(-1, 0, 0)) * Cylinder(9.200000000000085, 37, mode=Mode.PRIVATE)
    add(fillet_10_piece_2)

    # 圆角12
    fillet_12_edges = [extrude_2_piece_1_2.edges().sort_by_distance(p)[0] for p in [
        (9.5, 6, 31.160002881215497),
        (9.500000000000002, 5.75, 47.53500853797252),
    ]]
    fillet(fillet_12_edges, radius=FILLET_12_R)

    # 圆角8
    fillet_8_edges = [extrude_2_piece_1_2.edges().sort_by_distance(p)[0] for p in [
        (2.945736951557686, 5.75, 52.25281374238501),
        (6.526515759031643, 5.75, 47.98540773429275),
    ]]
    fillet(fillet_8_edges, radius=FILLET_8_R)

    # 圆角15
    fillet_15_edges = [extrude_2_piece_1_2.edges().sort_by_distance(p)[0] for p in [
        (7, 5, 26.352813742384996),
    ]]
    fillet(fillet_15_edges, radius=FILLET_15_R)

    # 圆角14
    fillet_14_edges = [extrude_2_piece_1_2.edges().sort_by_distance(p)[0] for p in [
        (5.25, 6, 29.352813742384996),
        (4.75, 6.5, 45.35716637684143),
    ]]
    fillet(fillet_14_edges, radius=FILLET_14_R)

    # 圆角16: read off the stored shape, not the designer's step
    # 圆角16 outline → 圆角16 (cut)
    with BuildSketch(Plane.YZ.offset(FILLET_START)):
        with BuildLine():
            ThreePointArc((10.997309563, 29.352813742), (9.476157021, 29.498723722), (8.010477223, 29.93113268))
            ThreePointArc((8.010477223, 29.93113268), (8.193031336, 29.595786035), (7.898501472, 29.352813742))
            Line((7.898501472, 29.352813742), (10.997309563, 29.352813742))
        make_face()
        with BuildLine():
            ThreePointArc((7.898501472, 45.357166377), (8.193031336, 45.114194084), (8.010477223, 44.778847439))
            ThreePointArc((8.010477223, 44.778847439), (9.476157021, 45.211256397), (10.997309563, 45.357166377))
            Line((10.997309563, 45.357166377), (7.898501472, 45.357166377))
        make_face()
    extrude(amount=FILLET_16_DEPTH, mode=Mode.SUBTRACT)

    # 镜向1: 凸台-拉伸2 piece 1 across plane


with BuildPart() as extrude_2_piece_1_3:
    add(extrude_2_piece_1_2.part)
    add(extrude_2_piece_1_2.part.mirror(Plane(origin=(0, 6, 0), x_dir=(0, 0, 1), z_dir=(-1, 0, 0))))

    # 草图5 → 切除-拉伸8 (cut)
    with BuildSketch(Plane(origin=(9.5, 0, 0), x_dir=(0, 0, -1), z_dir=(1, 0, 0))):
        Polygon((-41.97379221313022, 10.997309562540254), (-39.66439113637171, 6.9973095625402575), (-35.0455889828547, 6.997309562540257), (-32.7361879060962, 10.997309562540261), (-35.0455889828547, 14.997309562540265), (-39.664391136371705, 14.997309562540265), align=None)
    extrude(amount=-CUT_EXTRUDE_8_DEPTH, mode=Mode.SUBTRACT)


solid = extrude_2_piece_1_3.part
